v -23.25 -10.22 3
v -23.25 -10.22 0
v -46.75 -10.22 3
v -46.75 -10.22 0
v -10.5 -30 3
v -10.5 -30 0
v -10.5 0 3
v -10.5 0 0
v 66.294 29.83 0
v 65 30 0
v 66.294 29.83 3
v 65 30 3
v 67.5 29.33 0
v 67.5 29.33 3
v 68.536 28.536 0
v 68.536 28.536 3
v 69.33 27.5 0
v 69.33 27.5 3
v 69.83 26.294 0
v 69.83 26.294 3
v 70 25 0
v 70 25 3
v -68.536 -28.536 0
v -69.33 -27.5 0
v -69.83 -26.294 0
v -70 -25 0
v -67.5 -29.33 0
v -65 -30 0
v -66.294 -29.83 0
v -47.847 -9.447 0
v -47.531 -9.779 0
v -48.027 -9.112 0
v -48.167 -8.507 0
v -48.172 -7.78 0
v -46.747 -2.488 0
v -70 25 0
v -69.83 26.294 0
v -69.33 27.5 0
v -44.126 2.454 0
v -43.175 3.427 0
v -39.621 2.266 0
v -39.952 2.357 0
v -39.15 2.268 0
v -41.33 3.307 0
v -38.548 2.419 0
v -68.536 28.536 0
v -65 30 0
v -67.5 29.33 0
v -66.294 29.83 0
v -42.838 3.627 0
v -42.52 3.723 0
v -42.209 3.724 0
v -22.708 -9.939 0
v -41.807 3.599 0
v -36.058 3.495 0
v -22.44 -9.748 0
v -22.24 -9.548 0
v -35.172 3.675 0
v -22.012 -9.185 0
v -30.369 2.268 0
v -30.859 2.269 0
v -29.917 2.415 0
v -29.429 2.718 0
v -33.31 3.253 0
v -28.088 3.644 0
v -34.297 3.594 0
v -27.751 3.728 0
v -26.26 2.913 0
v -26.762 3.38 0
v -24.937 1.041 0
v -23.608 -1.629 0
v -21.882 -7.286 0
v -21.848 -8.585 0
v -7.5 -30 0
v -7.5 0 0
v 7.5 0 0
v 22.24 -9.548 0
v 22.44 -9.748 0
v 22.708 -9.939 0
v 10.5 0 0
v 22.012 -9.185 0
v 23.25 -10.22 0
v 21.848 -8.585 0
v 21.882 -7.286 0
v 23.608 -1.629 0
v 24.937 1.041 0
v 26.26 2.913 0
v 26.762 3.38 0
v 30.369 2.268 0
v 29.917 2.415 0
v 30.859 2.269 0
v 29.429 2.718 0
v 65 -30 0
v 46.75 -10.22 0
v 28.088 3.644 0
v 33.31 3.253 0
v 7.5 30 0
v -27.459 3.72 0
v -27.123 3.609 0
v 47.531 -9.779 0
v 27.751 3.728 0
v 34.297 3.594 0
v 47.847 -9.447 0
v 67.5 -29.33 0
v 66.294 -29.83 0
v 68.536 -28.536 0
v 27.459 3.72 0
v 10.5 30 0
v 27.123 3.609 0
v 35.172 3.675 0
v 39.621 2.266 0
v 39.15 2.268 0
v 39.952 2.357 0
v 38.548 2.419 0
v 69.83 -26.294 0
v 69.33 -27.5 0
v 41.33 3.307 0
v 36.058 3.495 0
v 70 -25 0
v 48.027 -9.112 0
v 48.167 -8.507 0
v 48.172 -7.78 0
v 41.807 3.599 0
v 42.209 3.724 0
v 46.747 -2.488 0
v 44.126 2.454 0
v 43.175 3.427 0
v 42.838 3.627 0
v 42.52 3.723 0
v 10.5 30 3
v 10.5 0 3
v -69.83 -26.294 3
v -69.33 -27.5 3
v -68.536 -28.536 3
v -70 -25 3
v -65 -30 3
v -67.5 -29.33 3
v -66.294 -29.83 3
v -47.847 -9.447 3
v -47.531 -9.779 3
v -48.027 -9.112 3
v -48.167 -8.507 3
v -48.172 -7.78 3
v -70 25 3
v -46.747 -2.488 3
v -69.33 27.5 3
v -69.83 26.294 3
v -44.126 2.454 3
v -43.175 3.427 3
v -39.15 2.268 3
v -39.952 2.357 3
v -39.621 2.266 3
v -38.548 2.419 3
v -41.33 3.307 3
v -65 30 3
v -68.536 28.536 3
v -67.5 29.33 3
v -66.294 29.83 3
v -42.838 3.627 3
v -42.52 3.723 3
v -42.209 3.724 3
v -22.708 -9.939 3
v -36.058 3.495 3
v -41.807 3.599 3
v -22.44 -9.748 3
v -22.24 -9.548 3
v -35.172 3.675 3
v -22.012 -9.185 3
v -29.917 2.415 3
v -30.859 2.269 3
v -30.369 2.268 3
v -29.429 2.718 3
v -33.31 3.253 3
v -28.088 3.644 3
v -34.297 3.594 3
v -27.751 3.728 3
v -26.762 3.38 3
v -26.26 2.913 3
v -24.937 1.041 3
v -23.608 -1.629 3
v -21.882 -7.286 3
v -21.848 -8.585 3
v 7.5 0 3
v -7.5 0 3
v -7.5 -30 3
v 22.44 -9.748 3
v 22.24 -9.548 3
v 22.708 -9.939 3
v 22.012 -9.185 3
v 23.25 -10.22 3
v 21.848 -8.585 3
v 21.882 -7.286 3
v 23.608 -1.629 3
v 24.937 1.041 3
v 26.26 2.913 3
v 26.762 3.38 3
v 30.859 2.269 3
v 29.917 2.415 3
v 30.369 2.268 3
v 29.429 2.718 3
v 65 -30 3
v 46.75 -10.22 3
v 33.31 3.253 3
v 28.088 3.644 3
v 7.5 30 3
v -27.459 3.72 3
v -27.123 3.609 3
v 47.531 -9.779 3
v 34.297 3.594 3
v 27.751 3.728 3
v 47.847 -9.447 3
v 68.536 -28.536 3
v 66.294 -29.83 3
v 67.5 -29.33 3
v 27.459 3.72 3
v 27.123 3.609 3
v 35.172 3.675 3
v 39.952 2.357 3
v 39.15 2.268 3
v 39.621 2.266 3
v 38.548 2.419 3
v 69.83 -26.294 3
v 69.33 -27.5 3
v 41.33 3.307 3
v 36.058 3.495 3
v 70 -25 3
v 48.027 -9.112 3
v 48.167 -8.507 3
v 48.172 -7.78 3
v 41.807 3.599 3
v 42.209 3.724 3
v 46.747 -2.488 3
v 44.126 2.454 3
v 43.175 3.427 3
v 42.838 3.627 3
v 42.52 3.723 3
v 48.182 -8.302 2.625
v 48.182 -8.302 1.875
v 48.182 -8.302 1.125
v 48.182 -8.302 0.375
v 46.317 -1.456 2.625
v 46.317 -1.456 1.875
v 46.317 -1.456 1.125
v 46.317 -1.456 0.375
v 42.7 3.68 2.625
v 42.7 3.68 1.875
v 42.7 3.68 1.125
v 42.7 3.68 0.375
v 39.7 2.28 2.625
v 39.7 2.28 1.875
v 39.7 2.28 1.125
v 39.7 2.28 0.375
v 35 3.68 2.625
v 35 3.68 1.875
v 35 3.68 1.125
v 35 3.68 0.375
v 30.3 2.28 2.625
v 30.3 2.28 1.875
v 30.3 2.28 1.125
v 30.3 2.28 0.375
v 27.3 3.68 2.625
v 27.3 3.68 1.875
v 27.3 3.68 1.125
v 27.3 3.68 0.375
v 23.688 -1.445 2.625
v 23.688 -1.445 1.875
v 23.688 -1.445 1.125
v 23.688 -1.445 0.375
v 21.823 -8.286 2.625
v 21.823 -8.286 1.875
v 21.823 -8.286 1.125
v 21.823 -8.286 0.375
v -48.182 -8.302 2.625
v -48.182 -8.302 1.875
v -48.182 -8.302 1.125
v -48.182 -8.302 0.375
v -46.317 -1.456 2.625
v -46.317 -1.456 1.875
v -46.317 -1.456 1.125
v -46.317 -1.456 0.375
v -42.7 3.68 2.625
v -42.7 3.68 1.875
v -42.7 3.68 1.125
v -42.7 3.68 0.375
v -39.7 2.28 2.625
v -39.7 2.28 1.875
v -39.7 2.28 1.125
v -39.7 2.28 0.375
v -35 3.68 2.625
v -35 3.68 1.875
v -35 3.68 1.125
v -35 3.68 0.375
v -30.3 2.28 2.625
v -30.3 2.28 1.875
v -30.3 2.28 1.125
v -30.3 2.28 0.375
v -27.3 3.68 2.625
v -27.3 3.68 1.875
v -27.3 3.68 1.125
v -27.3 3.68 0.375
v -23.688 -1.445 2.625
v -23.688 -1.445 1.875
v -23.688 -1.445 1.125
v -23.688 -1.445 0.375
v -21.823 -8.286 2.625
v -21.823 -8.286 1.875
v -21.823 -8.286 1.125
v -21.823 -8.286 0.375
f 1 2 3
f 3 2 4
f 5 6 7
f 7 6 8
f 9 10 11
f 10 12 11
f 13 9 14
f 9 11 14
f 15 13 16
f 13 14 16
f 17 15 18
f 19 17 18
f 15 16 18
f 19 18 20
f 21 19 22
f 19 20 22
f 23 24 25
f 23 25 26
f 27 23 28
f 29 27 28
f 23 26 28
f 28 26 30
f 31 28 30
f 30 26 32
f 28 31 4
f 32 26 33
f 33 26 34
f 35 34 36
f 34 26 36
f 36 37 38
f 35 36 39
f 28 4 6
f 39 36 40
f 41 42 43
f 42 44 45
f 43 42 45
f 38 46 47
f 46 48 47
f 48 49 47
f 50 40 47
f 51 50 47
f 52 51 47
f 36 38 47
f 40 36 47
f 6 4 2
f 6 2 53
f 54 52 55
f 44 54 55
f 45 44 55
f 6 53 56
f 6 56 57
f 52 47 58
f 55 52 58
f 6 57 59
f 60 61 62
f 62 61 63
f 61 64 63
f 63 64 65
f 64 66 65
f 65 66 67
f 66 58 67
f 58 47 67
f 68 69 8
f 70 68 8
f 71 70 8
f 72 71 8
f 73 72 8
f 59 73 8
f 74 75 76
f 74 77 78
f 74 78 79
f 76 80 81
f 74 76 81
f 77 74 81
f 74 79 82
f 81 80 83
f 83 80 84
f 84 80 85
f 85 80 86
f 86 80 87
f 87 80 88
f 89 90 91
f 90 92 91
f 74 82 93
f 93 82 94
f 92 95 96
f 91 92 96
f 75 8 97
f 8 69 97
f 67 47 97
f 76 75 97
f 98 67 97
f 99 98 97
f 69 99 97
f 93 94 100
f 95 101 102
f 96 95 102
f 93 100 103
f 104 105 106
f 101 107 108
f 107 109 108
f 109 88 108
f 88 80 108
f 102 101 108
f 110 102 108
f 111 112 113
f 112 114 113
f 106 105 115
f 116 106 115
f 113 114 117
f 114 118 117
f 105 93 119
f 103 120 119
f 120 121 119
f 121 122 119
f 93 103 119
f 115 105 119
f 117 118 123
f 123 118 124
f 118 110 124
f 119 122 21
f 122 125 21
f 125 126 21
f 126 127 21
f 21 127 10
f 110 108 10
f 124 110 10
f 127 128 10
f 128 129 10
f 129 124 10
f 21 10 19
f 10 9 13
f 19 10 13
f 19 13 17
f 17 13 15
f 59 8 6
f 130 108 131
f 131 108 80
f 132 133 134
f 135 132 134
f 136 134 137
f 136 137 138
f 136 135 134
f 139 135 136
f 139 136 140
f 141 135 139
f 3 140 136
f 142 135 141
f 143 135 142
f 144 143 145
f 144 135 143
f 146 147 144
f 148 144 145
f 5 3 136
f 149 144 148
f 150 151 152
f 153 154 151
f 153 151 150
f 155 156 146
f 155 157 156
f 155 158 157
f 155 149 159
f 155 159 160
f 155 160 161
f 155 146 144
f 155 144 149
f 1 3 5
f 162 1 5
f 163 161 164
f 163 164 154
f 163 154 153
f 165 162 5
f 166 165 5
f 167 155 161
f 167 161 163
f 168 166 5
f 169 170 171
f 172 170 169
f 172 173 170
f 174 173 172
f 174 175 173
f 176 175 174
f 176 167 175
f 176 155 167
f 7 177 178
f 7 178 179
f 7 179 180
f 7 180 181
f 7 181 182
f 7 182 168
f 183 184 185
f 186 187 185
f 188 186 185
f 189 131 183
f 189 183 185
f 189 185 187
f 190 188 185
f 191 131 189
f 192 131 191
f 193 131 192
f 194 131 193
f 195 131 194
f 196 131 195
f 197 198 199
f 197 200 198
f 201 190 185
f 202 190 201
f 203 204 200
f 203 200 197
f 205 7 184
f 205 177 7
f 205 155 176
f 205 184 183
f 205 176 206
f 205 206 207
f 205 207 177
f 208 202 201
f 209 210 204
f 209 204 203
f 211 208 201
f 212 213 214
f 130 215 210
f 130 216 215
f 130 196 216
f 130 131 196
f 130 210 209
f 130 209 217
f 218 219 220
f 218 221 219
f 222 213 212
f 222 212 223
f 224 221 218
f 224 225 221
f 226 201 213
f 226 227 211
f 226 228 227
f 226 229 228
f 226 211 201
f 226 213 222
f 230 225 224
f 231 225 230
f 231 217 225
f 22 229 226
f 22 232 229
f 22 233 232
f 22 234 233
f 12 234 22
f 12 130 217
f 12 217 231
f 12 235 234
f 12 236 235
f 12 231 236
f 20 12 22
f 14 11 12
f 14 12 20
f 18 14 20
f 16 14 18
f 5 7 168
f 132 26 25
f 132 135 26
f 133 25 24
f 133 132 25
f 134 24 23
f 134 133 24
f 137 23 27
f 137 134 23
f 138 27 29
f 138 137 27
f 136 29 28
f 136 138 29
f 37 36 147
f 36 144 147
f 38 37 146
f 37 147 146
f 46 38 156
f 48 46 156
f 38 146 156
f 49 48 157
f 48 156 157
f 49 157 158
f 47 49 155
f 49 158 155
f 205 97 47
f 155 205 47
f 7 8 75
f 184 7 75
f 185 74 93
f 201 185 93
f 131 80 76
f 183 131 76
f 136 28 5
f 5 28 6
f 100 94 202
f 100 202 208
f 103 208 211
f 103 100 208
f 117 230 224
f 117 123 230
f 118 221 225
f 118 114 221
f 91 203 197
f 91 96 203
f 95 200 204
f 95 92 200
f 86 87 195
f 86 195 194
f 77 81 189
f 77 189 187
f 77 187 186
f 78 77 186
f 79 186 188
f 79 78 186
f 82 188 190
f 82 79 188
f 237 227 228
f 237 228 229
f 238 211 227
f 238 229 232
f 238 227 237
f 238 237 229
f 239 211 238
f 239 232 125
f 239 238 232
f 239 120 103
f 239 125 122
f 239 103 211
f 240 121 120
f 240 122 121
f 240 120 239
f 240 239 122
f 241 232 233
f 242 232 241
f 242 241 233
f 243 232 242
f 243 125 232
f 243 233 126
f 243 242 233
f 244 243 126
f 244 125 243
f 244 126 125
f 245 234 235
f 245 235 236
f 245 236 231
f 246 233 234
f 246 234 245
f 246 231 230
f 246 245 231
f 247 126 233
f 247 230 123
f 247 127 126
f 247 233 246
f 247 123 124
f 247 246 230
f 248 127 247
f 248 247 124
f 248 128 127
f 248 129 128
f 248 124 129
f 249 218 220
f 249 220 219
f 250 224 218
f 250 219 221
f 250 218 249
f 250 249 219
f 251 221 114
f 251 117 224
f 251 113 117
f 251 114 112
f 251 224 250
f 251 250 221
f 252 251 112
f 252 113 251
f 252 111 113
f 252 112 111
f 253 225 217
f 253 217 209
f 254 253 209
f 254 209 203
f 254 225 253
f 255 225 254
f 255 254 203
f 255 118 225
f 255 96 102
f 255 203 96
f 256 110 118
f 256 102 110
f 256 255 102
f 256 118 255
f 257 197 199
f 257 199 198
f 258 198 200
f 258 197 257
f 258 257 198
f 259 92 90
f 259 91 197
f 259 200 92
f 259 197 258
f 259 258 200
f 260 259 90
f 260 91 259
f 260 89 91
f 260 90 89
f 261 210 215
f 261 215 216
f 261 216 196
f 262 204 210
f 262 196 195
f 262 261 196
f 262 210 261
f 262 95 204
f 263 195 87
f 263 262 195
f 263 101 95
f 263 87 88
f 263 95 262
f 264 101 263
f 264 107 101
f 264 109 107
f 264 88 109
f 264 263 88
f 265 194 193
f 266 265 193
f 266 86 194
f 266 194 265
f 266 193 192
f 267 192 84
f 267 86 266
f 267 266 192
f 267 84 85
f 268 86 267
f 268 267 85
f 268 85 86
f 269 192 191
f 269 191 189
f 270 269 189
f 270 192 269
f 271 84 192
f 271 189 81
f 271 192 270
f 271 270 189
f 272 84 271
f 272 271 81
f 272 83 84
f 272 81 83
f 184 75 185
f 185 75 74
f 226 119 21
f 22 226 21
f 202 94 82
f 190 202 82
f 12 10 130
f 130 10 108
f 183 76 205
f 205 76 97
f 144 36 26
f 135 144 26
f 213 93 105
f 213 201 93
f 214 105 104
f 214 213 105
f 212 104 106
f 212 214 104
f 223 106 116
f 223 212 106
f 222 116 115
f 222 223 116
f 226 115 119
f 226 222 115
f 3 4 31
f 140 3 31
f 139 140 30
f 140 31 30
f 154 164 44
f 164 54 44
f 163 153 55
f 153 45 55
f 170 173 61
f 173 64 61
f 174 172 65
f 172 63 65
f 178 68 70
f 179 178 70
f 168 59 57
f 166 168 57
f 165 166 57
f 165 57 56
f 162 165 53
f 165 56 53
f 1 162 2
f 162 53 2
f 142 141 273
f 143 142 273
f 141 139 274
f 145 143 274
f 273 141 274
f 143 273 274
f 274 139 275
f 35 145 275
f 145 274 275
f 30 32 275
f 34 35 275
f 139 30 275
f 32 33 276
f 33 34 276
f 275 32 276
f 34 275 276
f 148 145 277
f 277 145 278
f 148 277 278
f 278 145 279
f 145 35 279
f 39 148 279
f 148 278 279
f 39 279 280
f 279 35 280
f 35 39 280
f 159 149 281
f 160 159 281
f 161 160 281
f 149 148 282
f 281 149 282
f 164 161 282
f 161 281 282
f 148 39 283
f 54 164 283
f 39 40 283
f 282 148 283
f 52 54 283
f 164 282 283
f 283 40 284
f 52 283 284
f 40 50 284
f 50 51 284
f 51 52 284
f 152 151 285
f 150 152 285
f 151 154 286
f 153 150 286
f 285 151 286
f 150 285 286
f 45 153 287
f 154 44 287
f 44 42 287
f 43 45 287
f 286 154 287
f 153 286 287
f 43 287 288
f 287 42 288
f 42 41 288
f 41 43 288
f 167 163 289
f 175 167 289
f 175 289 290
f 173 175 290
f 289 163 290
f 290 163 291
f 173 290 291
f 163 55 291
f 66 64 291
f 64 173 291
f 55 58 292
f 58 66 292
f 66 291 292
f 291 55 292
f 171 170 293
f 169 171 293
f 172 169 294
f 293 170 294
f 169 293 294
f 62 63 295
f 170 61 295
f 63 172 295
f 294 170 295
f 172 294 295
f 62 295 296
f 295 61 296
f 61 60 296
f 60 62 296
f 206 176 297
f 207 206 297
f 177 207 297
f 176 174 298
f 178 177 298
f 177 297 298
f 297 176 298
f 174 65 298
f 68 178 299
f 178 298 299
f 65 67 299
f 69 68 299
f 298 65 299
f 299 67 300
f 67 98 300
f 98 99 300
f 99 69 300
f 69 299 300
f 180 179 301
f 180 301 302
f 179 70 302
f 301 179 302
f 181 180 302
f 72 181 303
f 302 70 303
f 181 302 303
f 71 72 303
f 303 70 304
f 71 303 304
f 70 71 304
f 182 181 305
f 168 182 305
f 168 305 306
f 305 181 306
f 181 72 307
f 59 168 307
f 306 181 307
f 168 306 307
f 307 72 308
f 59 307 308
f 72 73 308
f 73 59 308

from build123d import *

# Parameters (mm, degrees)
F1_DEPTH = 3
F2_R     = 5


with BuildPart() as f1:
    # F0 (on Top) → F1 (new body)
    with BuildSketch(Plane.XY):
        Polygon((-70, 30), (-70, -30), (-10.5, -30), (-10.5, 0), (-7.5, 0), (-7.5, -30), (70, -30), (70, 30), (10.5, 30), (10.5, 25), (10.5, 0), (7.5, 0), (7.5, 25), (7.5, 30), align=None)
        with BuildLine():
            Line((-23.25, -10.2196243256), (-35, -10.2196243256))
            Line((-35, -10.2196243256), (-46.75, -10.2196243256))
            add(Edge.make_bspline(
                [(-46.75, -10.2196243256), (-47.4398527053, -9.8994604487), (-49.7484516496, -8.8280288482), (-43.2152526161, 7.1056527722), (-39.7840829623, 0.6341609676), (-34.9999064665, 5.3524764777), (-30.2162578038, 0.6347077179), (-26.7843869073, 7.1013022273), (-20.2612774021, -8.808186377), (-22.5613884149, -9.8944243476), (-23.25, -10.2196243256)],
                knots=[0, 0, 0, 0, 0.0839701048, 0.2810067916, 0.3797698891, 0.4999744188, 0.6201789486, 0.7189420461, 0.9158563382, 1, 1, 1, 1], degree=3))
        make_face(mode=Mode.SUBTRACT)
        with BuildLine():
            add(Edge.make_bspline(
                [(46.75, -10.2196243256), (47.4398527053, -9.8994604487), (49.7484516496, -8.8280288482), (43.2152526161, 7.1056527722), (39.7840829623, 0.6341609676), (34.9999064665, 5.3524764777), (30.2162578038, 0.6347077179), (26.7843869073, 7.1013022273), (20.2612774021, -8.808186377), (22.5613884149, -9.8944243476), (23.25, -10.2196243256)],
                knots=[0, 0, 0, 0, 0.0839701048, 0.2810067916, 0.3797698891, 0.4999744188, 0.6201789486, 0.7189420461, 0.9158563382, 1, 1, 1, 1], degree=3))
            Line((46.75, -10.2196243256), (35, -10.2196243256))
            Line((35, -10.2196243256), (23.25, -10.2196243256))
        make_face(mode=Mode.SUBTRACT)
    extrude(amount=F1_DEPTH)

    # F2
    f2_edges = [f1.edges().sort_by_distance(p)[0] for p in [
        (70, -30, 1.5),
        (70, 30, 1.5),
        (-70, 30, 1.5),
        (-70, -30, 1.5),
    ]]
    fillet(f2_edges, radius=F2_R)


solid = f1.part
